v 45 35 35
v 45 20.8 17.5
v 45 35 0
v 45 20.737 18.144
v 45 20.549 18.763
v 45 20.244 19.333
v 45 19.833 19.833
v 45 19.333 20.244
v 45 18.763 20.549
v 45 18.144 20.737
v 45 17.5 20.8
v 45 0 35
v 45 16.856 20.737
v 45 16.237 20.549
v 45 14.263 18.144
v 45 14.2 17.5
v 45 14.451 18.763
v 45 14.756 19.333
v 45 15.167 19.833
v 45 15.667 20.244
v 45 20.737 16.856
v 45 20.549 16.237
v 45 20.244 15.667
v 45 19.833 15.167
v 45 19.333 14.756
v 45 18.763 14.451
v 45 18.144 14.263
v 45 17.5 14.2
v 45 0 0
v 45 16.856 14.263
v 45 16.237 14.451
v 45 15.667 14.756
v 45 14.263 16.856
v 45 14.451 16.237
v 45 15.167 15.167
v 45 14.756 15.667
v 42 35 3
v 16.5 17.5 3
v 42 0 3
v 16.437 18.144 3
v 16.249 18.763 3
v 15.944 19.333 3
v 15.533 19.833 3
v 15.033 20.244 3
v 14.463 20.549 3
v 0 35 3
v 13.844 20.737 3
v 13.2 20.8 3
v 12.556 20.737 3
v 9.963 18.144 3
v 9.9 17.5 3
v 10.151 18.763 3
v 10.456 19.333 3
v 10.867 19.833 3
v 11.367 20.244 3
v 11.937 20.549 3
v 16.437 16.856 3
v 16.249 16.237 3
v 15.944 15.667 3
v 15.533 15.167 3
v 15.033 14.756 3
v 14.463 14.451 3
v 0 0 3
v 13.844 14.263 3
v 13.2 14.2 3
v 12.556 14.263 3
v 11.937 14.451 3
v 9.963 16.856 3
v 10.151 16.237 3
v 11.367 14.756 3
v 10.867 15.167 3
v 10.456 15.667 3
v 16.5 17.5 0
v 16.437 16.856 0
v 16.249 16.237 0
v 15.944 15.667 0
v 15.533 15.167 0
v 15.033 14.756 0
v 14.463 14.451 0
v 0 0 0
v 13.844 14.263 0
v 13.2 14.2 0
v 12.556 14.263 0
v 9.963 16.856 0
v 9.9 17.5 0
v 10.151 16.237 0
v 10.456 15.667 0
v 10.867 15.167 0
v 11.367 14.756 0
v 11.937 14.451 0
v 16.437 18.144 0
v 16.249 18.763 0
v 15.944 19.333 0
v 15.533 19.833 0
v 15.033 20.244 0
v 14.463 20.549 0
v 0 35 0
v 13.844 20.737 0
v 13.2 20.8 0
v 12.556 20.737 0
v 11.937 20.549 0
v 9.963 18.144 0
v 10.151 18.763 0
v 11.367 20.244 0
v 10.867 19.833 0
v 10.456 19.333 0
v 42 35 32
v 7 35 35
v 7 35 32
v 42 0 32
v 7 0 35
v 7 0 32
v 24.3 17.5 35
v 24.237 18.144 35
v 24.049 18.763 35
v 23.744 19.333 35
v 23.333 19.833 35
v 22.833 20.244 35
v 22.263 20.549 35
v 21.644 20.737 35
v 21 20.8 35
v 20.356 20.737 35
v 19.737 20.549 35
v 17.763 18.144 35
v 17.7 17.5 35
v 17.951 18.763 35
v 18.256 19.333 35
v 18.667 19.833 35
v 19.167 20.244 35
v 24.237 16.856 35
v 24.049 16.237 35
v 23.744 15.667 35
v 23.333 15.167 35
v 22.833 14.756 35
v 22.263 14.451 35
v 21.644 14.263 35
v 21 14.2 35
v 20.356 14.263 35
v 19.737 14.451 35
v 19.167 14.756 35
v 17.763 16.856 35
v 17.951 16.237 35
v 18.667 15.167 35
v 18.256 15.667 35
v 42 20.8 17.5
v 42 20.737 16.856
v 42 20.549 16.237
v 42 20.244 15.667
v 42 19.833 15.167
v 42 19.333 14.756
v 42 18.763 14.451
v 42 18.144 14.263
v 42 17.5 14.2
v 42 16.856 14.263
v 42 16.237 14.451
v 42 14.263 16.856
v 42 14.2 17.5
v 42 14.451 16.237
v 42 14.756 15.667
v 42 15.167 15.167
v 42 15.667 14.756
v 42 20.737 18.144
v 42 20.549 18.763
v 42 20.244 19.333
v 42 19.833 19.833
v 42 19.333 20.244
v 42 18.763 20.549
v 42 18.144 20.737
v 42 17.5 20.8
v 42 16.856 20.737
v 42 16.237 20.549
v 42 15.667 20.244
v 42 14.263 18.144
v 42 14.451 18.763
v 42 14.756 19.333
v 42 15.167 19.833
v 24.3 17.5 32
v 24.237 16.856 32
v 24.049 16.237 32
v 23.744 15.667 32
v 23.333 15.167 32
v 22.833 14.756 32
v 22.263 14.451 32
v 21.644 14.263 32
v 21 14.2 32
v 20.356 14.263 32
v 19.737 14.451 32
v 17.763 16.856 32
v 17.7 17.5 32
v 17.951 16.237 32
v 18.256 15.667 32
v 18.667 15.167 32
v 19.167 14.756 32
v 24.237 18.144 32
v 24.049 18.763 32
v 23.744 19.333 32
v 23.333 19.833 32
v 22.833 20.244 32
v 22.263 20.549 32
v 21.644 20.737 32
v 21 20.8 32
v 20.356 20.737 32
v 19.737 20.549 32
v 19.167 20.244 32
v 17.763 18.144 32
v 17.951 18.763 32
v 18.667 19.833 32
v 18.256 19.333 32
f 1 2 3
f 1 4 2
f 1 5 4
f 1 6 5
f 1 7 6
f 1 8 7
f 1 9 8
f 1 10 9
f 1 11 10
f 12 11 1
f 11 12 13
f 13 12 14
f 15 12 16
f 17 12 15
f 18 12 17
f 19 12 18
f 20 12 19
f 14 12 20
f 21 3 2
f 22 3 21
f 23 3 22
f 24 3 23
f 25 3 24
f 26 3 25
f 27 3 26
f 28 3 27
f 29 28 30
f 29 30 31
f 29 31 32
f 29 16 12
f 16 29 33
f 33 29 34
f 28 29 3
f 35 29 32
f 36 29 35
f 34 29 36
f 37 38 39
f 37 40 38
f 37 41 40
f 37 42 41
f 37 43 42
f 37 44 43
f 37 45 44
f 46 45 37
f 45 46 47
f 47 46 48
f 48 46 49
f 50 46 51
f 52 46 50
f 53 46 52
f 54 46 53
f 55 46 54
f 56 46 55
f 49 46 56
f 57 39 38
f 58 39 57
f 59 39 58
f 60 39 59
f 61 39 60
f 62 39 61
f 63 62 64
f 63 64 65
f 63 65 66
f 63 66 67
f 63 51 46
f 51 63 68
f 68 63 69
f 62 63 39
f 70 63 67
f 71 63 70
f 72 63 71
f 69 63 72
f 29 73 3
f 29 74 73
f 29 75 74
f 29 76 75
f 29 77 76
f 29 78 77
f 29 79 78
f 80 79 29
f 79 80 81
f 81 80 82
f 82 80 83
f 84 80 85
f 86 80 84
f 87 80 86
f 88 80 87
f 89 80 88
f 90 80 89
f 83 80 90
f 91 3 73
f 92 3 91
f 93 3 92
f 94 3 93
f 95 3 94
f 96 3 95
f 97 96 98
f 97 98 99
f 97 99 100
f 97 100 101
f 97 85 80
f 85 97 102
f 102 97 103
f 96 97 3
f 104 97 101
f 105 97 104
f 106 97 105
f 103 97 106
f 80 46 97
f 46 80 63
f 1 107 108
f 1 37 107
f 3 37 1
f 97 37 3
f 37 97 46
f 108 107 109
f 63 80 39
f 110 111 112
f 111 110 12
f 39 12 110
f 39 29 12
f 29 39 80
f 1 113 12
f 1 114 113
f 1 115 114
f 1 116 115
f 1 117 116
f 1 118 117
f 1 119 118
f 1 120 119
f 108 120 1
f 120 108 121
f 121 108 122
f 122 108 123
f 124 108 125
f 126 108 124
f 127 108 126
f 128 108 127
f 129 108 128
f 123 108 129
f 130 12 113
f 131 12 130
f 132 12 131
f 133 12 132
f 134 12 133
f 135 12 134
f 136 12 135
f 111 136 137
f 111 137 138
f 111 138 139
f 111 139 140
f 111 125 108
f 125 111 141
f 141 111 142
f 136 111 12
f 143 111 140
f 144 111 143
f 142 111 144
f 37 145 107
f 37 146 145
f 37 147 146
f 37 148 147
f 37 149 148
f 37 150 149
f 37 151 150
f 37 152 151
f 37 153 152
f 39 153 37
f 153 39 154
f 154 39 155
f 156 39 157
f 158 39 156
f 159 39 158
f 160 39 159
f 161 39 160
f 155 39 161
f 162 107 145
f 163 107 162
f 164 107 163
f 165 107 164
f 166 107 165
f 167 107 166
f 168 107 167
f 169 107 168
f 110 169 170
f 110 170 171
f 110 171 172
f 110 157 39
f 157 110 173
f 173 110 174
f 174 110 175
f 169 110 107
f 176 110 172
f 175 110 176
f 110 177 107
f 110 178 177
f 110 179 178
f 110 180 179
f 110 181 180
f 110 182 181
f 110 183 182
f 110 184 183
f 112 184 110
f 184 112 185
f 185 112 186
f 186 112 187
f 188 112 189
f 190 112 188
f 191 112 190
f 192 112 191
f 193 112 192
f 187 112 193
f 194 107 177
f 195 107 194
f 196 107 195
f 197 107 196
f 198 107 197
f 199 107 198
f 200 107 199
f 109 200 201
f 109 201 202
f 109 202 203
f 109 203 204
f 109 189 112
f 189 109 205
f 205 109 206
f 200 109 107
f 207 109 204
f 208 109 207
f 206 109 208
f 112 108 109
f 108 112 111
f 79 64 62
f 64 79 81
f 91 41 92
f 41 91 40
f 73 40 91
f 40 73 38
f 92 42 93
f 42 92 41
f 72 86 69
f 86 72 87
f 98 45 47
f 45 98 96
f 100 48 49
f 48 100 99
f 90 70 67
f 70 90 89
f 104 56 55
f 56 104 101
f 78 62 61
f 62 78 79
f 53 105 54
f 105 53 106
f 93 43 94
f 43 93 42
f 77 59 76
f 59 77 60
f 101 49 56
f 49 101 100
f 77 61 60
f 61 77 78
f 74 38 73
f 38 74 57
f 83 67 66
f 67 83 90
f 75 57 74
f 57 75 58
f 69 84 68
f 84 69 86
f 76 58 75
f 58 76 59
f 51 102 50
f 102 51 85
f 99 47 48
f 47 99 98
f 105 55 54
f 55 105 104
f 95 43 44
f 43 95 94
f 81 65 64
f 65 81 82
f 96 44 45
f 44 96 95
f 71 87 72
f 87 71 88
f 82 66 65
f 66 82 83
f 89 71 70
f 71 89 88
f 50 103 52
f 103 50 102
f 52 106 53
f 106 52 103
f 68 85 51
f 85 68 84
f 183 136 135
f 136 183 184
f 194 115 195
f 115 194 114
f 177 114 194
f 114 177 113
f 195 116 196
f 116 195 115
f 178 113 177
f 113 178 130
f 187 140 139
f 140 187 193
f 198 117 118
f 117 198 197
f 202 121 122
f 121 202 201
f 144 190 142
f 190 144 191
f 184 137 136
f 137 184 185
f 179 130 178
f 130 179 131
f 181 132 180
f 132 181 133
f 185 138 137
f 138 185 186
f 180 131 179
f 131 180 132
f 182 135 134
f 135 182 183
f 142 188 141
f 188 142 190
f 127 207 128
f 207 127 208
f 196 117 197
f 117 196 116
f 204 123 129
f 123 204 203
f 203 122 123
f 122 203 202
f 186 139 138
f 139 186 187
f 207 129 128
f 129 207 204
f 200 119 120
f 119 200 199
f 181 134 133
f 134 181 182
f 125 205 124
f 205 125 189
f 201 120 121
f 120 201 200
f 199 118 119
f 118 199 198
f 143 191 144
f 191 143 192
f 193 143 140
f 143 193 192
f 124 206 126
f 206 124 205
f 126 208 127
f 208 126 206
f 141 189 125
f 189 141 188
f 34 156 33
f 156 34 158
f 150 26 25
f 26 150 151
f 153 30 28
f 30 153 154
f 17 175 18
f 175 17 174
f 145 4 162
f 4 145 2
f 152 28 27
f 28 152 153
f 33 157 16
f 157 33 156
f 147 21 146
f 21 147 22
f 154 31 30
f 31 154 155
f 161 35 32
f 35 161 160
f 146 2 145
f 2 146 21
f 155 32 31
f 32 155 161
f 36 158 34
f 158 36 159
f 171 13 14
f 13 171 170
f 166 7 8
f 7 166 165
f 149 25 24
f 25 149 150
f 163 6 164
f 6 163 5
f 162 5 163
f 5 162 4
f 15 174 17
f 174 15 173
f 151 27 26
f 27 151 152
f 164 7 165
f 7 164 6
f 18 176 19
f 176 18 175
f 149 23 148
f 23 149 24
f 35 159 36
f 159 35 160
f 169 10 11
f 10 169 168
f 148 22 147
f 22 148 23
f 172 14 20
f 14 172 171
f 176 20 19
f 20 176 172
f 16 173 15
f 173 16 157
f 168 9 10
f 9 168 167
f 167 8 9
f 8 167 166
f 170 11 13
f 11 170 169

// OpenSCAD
$fn = 32;

// ----------------------------------------------------------------------
// Z-bracket: 45 x 35 x 35 mm
// ----------------------------------------------------------------------

// --- parameters (mm) ---
bottom_run = 45;          // lower foot length, X
top_run = 35;             // upper foot length, X
profile_w = 35;           // bracket width, Y
height = 35;              // overall rise, Z
mat_t = 3;                // plate thickness
hole_d = 6.6;             // clearance for M6

module hole_z(px, py, z0) {
  translate([px, py, z0 - 2.5]) cylinder(h = mat_t + 5, d = hole_d);
}
module hole_x(py, pz) {
  translate([-2.5, py, pz]) rotate([0, 90, 0]) cylinder(h = mat_t + 5, d = hole_d);
}

difference() {
  union() {
    cube([bottom_run, profile_w, mat_t]);
    /* web, overlapping the lower foot */
    translate([bottom_run - mat_t, 0, 0]) cube([mat_t, profile_w, height]);
    /* upper foot, sunk into the web */
    translate([bottom_run - mat_t - top_run, 0, height - mat_t]) cube([top_run + mat_t, profile_w, mat_t]);
  }
  hole_z(13.2, 17.5, 0);
  translate([bottom_run - mat_t - 21, 0, 0]) hole_z(0, 17.5, height - mat_t);
  translate([bottom_run - mat_t, 0, 0]) hole_x(17.5, 17.5);
}
